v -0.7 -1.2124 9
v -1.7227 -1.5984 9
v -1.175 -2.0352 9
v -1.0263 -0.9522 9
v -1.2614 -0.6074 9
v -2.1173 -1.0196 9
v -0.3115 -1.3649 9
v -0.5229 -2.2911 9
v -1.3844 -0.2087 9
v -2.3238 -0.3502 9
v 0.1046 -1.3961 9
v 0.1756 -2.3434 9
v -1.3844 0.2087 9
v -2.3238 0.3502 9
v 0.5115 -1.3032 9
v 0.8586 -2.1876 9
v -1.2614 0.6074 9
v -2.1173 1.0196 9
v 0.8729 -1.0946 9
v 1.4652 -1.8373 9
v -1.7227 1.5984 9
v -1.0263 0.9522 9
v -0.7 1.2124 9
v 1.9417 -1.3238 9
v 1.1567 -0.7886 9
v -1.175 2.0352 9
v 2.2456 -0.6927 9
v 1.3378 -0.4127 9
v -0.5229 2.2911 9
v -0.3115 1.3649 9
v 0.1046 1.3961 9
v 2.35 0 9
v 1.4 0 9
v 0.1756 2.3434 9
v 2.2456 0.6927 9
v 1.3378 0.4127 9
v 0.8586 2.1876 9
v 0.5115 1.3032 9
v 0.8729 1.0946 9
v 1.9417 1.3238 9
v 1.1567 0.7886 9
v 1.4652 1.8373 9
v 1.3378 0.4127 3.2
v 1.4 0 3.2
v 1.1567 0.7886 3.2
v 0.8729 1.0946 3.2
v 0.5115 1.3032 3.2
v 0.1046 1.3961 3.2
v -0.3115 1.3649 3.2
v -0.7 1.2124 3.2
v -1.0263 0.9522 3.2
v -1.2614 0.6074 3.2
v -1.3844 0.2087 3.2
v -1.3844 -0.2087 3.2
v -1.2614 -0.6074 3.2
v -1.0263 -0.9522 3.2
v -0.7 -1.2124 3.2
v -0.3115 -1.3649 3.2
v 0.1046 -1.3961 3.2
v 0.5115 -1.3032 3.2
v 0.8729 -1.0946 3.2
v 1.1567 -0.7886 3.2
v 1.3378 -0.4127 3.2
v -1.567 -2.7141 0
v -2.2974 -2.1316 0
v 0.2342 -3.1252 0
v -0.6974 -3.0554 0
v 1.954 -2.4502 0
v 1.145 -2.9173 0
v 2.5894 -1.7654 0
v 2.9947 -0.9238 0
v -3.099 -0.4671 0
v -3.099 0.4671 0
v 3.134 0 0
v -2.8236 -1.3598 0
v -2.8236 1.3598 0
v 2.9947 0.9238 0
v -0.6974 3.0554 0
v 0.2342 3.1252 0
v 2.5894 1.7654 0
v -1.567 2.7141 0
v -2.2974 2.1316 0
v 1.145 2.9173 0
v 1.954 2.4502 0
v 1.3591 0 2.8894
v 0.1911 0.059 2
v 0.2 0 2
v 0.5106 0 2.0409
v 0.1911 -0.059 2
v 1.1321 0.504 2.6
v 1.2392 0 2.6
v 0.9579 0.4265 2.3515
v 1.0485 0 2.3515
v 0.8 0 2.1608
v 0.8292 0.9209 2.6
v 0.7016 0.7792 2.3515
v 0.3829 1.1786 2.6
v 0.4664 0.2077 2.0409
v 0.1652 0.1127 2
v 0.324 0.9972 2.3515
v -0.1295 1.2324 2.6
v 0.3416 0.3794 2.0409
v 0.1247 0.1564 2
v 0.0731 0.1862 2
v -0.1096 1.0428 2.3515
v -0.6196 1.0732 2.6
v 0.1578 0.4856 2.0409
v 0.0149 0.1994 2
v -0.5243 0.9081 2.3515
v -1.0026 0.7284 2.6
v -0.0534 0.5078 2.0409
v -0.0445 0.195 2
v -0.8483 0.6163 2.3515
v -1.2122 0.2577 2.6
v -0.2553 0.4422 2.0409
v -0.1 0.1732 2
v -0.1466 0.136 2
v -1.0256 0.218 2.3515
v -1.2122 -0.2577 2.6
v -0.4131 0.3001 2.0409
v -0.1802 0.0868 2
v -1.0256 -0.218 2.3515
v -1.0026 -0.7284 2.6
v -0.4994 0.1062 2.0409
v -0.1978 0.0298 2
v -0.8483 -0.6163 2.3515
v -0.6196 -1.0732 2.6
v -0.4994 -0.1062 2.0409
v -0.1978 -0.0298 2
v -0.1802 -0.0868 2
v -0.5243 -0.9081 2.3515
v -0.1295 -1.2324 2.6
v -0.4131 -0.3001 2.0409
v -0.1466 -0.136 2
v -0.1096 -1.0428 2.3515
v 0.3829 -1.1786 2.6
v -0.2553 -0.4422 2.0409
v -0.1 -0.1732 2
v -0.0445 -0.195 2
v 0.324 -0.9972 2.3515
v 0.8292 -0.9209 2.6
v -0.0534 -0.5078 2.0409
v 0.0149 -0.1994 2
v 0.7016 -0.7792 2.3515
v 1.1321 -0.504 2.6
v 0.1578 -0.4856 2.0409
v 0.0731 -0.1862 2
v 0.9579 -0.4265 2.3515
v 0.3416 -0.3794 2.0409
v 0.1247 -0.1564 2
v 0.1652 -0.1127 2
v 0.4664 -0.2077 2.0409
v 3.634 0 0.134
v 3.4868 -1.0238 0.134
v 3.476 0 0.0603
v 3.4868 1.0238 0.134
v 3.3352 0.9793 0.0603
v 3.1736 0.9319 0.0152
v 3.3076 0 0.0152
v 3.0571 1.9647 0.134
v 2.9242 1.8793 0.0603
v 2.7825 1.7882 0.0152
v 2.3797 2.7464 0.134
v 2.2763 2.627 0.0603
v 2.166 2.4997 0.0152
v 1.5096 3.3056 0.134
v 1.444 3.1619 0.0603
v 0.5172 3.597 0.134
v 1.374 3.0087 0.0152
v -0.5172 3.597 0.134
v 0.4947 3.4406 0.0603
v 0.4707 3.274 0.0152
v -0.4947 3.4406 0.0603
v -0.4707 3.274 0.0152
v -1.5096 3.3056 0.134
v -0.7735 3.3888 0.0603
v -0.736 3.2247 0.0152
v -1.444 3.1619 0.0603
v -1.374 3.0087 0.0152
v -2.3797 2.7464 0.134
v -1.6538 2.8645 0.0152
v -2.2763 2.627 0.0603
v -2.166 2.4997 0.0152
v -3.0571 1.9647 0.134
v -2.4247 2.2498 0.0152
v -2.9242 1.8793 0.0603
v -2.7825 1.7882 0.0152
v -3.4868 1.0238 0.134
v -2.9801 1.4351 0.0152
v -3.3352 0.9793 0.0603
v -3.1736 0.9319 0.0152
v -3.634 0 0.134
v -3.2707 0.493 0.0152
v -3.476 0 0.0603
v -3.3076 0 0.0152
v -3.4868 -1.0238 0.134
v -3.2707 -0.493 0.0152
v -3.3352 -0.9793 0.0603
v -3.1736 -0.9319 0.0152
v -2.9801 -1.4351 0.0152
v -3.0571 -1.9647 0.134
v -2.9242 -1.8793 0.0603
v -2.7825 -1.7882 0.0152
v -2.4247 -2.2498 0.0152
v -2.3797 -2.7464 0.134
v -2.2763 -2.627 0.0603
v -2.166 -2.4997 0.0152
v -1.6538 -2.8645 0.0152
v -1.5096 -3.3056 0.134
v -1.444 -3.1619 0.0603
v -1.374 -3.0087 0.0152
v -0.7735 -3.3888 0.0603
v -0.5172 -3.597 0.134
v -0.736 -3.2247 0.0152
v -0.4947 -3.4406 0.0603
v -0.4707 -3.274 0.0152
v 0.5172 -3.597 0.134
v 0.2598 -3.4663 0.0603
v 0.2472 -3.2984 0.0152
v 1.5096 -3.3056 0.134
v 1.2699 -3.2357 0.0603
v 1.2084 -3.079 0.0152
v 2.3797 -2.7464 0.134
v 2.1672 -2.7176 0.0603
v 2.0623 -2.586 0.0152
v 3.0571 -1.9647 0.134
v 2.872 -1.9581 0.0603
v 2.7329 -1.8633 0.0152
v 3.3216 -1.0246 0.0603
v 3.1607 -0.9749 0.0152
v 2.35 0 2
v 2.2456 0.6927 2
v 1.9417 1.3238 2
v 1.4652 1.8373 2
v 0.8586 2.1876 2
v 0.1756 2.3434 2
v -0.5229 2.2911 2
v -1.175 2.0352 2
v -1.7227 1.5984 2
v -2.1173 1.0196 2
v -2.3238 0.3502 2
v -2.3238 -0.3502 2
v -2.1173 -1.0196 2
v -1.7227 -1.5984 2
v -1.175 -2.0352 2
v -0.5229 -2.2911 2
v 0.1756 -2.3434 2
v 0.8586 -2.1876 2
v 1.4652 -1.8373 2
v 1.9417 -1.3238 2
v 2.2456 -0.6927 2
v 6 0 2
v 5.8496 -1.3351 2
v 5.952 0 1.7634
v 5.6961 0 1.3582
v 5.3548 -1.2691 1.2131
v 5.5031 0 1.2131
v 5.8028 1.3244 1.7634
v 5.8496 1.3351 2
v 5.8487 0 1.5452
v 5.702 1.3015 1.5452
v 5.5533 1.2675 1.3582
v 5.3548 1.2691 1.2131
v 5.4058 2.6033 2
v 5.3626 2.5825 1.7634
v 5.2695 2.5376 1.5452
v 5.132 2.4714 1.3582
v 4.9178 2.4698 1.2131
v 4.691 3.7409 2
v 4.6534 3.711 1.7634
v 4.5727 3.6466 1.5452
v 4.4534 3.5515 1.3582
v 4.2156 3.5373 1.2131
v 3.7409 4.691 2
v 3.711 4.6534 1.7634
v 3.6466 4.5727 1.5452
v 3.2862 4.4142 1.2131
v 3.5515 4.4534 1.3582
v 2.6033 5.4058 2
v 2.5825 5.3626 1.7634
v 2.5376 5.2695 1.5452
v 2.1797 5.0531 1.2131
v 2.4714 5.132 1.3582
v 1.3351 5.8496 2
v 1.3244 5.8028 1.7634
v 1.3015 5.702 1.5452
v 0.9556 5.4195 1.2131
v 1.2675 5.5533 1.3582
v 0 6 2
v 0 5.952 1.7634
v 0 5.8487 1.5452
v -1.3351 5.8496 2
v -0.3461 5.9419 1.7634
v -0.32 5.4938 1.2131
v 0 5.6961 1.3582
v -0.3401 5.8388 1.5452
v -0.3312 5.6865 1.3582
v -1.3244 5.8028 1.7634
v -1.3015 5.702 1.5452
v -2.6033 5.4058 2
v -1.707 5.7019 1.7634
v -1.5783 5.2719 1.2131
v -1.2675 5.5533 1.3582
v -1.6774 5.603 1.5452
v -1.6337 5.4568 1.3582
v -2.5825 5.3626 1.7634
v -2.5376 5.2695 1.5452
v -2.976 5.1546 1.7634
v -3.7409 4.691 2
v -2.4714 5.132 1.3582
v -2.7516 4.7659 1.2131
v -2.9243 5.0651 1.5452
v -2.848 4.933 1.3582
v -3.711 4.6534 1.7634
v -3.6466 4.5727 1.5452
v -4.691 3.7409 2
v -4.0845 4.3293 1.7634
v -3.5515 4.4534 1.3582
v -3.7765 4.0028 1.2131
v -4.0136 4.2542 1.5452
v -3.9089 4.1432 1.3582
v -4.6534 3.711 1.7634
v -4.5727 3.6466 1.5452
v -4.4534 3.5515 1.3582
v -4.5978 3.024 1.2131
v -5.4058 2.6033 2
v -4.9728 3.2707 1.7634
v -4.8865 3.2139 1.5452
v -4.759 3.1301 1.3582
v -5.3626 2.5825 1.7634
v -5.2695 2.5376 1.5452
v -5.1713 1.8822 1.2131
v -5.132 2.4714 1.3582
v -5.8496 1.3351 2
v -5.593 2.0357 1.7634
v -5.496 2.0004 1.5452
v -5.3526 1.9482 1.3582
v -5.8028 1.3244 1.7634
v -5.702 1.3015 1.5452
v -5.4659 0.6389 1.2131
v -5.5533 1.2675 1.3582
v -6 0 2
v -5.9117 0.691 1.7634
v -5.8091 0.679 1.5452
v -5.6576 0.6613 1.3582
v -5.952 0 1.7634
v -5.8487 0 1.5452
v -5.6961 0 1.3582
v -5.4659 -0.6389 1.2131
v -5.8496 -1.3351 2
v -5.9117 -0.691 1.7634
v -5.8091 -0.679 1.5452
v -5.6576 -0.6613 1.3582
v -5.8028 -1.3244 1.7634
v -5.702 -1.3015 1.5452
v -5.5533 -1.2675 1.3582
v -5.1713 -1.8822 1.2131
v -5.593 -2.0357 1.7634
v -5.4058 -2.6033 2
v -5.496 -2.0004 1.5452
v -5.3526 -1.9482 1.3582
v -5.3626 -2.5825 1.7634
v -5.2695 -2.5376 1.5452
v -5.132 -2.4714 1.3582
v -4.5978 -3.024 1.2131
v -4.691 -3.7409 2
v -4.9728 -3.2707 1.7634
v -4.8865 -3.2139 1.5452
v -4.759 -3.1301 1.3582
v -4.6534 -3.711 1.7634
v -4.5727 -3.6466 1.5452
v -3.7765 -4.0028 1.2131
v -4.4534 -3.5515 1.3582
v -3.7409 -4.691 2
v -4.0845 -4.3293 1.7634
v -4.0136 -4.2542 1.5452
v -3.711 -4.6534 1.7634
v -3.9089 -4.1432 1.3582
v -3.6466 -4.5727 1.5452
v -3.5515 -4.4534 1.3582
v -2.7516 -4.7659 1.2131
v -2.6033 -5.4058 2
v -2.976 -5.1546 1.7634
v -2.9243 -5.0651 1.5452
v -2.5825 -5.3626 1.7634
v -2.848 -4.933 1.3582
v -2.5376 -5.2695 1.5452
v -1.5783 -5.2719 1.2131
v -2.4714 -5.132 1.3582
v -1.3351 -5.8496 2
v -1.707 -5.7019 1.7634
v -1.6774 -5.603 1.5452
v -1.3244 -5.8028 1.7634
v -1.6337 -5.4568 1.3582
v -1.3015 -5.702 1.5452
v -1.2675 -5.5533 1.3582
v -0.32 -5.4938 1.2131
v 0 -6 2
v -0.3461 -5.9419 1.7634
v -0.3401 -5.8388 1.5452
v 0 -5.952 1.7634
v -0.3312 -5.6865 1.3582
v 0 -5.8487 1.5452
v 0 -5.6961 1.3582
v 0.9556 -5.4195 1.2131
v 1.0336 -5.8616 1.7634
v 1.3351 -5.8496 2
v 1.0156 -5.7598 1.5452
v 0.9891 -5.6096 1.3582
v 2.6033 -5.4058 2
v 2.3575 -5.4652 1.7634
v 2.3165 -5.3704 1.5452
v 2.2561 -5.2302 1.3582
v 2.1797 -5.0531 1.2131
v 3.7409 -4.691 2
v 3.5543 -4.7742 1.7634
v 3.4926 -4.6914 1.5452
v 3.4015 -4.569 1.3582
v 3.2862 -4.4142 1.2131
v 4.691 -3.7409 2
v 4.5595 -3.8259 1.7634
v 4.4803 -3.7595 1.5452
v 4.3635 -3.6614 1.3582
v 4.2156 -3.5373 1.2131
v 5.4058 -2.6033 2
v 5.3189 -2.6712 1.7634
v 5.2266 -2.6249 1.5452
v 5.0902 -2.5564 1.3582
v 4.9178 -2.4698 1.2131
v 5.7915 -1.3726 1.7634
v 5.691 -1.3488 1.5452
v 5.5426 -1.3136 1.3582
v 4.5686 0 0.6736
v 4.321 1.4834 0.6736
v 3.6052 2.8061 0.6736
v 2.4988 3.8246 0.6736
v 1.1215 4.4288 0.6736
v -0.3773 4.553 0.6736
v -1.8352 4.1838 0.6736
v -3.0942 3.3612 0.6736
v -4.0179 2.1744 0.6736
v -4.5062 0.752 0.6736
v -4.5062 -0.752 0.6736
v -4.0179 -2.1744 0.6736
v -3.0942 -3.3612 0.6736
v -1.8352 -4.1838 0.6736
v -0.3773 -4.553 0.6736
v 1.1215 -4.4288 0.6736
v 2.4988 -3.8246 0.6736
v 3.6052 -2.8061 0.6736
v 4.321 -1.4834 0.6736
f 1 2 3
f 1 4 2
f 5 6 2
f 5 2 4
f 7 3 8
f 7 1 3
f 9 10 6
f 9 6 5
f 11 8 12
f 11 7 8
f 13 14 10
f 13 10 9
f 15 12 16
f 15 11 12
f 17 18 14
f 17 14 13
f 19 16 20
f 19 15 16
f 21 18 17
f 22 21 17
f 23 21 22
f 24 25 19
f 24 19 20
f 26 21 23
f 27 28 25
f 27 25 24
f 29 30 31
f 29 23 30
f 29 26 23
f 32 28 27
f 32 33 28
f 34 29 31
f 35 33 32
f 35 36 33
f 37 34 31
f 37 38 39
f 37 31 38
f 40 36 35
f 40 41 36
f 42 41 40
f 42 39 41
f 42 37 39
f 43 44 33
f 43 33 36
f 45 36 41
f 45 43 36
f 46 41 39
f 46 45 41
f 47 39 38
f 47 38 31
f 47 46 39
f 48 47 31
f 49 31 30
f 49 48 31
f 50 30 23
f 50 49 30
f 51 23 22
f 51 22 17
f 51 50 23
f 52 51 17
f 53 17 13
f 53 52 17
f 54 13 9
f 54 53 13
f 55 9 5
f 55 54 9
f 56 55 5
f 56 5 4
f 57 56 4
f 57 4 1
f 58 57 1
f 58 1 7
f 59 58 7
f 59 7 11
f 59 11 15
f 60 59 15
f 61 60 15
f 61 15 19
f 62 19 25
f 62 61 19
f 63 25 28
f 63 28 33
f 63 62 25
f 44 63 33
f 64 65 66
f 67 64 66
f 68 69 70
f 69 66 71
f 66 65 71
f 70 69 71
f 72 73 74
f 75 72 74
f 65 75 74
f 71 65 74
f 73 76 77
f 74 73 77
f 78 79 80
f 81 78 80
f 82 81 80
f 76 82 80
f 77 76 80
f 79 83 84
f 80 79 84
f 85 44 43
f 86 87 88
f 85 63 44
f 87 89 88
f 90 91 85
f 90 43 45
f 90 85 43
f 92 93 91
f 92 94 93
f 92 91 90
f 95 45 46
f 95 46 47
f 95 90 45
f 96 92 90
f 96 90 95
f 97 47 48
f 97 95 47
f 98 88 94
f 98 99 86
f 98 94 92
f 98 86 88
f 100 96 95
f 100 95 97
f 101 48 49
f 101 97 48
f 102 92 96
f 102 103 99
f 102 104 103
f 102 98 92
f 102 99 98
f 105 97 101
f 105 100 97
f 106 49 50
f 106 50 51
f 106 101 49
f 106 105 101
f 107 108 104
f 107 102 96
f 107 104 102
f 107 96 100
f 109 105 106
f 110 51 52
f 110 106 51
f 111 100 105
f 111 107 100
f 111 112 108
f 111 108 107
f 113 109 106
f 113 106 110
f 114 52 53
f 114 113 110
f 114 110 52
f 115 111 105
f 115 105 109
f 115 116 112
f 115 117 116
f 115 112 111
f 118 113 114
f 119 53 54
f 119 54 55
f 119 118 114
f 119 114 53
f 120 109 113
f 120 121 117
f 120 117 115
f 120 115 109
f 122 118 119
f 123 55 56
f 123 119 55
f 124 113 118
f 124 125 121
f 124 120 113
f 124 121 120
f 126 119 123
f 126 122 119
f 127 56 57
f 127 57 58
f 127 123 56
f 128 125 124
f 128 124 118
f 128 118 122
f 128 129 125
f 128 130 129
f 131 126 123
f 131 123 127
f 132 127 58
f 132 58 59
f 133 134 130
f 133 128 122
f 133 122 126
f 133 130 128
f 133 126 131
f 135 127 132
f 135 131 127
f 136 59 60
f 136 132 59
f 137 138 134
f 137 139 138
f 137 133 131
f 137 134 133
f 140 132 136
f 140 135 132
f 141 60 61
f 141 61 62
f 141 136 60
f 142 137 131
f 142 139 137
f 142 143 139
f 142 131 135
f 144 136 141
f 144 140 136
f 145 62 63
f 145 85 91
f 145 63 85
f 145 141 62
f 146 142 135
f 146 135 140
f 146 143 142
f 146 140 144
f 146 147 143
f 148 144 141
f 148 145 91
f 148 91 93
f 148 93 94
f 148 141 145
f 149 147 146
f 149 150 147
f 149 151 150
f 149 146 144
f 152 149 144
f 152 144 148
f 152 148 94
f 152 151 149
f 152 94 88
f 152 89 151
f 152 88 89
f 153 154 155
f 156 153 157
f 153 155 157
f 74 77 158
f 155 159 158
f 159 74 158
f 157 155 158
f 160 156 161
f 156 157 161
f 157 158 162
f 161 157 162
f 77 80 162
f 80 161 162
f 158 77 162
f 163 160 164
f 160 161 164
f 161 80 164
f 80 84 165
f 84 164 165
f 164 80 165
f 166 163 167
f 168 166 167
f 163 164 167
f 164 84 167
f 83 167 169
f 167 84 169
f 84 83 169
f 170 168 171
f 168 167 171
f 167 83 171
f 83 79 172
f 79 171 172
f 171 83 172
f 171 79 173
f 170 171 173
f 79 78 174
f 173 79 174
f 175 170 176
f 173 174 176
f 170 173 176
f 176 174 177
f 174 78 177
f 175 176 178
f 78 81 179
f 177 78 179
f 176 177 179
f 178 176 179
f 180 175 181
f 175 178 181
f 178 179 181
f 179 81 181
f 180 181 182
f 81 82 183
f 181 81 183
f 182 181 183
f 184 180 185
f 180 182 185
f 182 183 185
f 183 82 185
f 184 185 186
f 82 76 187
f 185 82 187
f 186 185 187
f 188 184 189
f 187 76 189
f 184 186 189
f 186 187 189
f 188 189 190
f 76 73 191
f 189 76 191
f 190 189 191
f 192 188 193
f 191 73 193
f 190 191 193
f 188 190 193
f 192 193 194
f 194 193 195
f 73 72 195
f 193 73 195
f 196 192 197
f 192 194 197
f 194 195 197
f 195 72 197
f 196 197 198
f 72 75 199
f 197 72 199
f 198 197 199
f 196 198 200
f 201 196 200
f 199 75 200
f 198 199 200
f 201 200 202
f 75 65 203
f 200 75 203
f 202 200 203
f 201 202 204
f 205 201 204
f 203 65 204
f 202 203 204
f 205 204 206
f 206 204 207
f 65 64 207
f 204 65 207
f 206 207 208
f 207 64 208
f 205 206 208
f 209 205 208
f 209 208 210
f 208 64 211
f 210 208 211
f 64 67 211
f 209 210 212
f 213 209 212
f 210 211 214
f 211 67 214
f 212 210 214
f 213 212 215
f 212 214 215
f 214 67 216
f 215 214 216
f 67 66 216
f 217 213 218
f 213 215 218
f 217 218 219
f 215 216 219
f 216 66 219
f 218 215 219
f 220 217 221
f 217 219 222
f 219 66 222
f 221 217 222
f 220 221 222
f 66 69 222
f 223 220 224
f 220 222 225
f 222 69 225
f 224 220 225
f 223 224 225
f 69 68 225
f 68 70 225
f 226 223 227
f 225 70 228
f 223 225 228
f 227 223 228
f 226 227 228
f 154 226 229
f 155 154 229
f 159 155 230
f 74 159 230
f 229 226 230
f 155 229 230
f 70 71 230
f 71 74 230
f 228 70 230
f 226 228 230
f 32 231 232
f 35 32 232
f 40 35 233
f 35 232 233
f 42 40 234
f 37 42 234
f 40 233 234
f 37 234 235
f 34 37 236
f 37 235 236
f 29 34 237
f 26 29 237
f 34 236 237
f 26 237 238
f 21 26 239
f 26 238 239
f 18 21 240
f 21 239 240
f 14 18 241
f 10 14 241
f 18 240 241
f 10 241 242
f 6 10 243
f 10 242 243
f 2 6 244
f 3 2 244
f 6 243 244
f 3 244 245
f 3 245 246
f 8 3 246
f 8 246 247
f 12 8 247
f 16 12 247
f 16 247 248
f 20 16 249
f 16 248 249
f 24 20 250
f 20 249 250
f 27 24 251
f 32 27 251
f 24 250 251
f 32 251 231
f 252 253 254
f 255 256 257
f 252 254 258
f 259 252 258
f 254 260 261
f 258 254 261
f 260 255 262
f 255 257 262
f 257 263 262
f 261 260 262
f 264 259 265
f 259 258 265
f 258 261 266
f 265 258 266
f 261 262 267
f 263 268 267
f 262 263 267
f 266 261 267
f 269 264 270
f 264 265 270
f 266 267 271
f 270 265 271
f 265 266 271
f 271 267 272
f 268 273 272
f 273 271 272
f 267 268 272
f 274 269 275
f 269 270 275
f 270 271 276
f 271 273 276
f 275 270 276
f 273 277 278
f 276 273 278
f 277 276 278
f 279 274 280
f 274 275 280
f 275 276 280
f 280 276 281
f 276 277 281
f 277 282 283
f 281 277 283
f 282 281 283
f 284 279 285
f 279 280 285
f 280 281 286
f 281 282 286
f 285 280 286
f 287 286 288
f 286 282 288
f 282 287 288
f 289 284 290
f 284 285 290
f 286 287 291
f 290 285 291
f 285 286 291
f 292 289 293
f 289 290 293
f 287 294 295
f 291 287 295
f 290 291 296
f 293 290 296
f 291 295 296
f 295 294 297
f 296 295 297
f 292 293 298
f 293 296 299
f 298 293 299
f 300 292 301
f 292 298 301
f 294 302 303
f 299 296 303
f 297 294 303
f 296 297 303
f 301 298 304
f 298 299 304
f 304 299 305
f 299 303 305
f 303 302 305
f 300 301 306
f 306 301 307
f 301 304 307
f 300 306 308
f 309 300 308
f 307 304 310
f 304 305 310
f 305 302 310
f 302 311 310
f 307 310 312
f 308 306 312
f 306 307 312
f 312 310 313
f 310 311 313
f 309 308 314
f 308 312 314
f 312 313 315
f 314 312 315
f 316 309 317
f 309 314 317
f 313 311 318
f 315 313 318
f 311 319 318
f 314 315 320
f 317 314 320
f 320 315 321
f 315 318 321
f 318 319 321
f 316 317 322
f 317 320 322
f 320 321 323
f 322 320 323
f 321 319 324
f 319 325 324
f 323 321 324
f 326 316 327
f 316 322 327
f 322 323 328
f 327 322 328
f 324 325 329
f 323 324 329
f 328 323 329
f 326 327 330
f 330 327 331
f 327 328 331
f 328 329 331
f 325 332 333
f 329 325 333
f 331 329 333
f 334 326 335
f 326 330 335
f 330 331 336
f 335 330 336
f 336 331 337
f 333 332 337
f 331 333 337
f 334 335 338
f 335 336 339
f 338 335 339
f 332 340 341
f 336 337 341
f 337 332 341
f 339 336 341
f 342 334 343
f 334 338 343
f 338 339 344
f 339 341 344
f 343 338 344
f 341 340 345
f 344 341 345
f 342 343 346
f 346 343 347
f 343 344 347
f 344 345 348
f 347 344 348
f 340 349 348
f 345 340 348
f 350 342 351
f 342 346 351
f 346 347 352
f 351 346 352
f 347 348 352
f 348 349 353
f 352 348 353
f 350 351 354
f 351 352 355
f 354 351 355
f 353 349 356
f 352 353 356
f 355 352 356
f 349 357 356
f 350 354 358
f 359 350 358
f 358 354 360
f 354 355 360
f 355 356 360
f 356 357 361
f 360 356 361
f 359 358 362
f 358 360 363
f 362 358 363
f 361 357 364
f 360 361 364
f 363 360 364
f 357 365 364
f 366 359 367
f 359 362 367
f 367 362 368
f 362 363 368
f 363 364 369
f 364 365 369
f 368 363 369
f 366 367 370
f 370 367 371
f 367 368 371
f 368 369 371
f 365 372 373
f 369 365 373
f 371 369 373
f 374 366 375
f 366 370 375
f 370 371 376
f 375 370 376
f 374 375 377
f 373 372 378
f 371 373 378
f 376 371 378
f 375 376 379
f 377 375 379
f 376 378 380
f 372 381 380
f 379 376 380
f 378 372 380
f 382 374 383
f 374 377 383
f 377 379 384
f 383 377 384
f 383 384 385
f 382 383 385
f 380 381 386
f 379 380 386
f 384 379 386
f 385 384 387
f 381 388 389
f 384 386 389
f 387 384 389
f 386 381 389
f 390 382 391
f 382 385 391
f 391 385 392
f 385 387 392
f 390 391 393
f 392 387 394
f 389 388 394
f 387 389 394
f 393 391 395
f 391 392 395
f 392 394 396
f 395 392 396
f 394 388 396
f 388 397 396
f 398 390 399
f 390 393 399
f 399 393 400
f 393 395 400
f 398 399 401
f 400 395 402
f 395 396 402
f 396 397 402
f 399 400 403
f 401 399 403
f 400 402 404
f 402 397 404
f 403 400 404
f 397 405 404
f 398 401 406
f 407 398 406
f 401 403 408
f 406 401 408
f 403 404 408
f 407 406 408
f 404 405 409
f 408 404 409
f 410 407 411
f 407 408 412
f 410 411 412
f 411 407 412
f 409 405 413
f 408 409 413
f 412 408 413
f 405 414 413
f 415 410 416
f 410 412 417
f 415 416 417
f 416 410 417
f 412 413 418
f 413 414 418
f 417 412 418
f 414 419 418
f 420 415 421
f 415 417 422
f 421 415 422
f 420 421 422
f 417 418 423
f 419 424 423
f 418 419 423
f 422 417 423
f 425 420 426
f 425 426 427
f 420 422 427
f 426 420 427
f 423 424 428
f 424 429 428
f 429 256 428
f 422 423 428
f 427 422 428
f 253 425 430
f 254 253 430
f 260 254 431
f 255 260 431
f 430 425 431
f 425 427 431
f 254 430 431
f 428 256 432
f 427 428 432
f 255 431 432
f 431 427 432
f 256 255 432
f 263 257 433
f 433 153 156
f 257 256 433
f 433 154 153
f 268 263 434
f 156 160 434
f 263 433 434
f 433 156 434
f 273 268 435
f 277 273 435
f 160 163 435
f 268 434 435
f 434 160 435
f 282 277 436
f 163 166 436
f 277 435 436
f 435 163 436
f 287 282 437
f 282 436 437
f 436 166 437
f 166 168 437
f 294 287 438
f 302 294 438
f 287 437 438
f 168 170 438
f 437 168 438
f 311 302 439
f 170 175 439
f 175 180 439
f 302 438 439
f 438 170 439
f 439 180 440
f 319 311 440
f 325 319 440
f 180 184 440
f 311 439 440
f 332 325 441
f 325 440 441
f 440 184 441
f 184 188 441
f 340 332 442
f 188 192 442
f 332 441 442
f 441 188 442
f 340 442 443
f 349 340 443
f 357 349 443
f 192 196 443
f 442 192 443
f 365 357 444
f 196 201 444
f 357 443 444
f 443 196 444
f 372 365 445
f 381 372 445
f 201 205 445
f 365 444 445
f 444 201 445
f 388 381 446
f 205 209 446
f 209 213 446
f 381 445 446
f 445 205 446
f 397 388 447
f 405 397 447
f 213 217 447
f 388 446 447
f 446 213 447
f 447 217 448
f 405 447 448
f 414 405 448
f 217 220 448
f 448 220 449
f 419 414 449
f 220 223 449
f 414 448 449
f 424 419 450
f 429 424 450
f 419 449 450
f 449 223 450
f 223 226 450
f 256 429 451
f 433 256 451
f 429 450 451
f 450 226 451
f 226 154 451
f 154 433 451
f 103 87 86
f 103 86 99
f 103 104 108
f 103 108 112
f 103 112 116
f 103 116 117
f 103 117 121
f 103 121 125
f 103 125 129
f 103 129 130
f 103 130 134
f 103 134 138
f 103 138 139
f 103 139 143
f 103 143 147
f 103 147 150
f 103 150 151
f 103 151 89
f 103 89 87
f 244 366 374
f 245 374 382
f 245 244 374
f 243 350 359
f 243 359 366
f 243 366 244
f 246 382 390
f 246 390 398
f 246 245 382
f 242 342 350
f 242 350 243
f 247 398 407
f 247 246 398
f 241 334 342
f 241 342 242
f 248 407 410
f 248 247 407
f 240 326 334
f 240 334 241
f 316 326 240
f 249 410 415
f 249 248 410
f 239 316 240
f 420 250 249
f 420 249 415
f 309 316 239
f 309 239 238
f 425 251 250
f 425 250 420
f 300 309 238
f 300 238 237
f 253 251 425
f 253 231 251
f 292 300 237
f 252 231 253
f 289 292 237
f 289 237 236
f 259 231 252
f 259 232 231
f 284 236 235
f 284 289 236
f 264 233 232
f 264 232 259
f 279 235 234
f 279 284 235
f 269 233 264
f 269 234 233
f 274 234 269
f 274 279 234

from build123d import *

# Parameters (mm, degrees)
F0_R     = 6
F1_DEPTH = 2
F2_SIZE2 = 2.5980762114
F2_SIZE  = 1.5
F4_R     = 2.35
F4_R_2   = 1.4
F5_DEPTH = 7
F6_R     = 1.2


# Not quite as in the source:
# - a fillet or chamfer that OpenCascade refuses, or shapes differently, is made with other operations: its cross-section is extruded or revolved along the edge and cut away or added


with BuildPart() as f1:
    # F0 (on Top) → F1 (new body)
    with BuildSketch(Plane.XY):
        Circle(F0_R)
    extrude(amount=F1_DEPTH)

    # F2
    f2_edges = [f1.edges().sort_by_distance(p)[0] for p in [
        (-6, 0, 0),
    ]]
    f2_side = f1.faces().sort_by_distance((-6, 0, 1))[0]
    chamfer(f2_edges, length=F2_SIZE, length2=F2_SIZE2, reference=f2_side)

    # F3: fillet of radius 1 on 2 edges, made by hand

    # F3_s1 → F3_t2 (revolve, cut)
    with BuildSketch(Plane.XZ):
        with BuildLine():
            ThreePointArc((3.6339745962, 0.1339745962), (3.3927936413, 0.0340741737), (3.1339745962, 0))
            Line((3.1339745962, 0), (3.4019237886, 0))
            Line((3.4019237886, 0), (3.6339745962, 0.1339745962))
        make_face()
    revolve(axis=Axis((0, 0, 0), (0, 0, 1)), mode=Mode.SUBTRACT)

    # F3_s3 → F3_t4 (revolve, cut)
    with BuildSketch(Plane.XZ):
        with BuildLine():
            ThreePointArc((6, 2), (5.8486778537, 1.5452494356), (5.5031382462, 1.2131367327))
            Line((5.5031382462, 1.2131367327), (6, 1.5))
            Line((6, 1.5), (6, 2))
        make_face()
    revolve(axis=Axis((0, 0, 1.5), (0, 0, 1)), mode=Mode.SUBTRACT)

    # F4 (on face) → F5 (join)
    with BuildSketch(Plane.XY.offset(2)):
        Circle(F4_R)
        Circle(F4_R_2, mode=Mode.SUBTRACT)
    extrude(amount=F5_DEPTH)

    # F6
    f6_edges = [f1.edges().sort_by_distance(p)[0] for p in [
        (-1.4, 0, 2),
    ]]
    fillet(f6_edges, radius=F6_R)


solid = f1.part
